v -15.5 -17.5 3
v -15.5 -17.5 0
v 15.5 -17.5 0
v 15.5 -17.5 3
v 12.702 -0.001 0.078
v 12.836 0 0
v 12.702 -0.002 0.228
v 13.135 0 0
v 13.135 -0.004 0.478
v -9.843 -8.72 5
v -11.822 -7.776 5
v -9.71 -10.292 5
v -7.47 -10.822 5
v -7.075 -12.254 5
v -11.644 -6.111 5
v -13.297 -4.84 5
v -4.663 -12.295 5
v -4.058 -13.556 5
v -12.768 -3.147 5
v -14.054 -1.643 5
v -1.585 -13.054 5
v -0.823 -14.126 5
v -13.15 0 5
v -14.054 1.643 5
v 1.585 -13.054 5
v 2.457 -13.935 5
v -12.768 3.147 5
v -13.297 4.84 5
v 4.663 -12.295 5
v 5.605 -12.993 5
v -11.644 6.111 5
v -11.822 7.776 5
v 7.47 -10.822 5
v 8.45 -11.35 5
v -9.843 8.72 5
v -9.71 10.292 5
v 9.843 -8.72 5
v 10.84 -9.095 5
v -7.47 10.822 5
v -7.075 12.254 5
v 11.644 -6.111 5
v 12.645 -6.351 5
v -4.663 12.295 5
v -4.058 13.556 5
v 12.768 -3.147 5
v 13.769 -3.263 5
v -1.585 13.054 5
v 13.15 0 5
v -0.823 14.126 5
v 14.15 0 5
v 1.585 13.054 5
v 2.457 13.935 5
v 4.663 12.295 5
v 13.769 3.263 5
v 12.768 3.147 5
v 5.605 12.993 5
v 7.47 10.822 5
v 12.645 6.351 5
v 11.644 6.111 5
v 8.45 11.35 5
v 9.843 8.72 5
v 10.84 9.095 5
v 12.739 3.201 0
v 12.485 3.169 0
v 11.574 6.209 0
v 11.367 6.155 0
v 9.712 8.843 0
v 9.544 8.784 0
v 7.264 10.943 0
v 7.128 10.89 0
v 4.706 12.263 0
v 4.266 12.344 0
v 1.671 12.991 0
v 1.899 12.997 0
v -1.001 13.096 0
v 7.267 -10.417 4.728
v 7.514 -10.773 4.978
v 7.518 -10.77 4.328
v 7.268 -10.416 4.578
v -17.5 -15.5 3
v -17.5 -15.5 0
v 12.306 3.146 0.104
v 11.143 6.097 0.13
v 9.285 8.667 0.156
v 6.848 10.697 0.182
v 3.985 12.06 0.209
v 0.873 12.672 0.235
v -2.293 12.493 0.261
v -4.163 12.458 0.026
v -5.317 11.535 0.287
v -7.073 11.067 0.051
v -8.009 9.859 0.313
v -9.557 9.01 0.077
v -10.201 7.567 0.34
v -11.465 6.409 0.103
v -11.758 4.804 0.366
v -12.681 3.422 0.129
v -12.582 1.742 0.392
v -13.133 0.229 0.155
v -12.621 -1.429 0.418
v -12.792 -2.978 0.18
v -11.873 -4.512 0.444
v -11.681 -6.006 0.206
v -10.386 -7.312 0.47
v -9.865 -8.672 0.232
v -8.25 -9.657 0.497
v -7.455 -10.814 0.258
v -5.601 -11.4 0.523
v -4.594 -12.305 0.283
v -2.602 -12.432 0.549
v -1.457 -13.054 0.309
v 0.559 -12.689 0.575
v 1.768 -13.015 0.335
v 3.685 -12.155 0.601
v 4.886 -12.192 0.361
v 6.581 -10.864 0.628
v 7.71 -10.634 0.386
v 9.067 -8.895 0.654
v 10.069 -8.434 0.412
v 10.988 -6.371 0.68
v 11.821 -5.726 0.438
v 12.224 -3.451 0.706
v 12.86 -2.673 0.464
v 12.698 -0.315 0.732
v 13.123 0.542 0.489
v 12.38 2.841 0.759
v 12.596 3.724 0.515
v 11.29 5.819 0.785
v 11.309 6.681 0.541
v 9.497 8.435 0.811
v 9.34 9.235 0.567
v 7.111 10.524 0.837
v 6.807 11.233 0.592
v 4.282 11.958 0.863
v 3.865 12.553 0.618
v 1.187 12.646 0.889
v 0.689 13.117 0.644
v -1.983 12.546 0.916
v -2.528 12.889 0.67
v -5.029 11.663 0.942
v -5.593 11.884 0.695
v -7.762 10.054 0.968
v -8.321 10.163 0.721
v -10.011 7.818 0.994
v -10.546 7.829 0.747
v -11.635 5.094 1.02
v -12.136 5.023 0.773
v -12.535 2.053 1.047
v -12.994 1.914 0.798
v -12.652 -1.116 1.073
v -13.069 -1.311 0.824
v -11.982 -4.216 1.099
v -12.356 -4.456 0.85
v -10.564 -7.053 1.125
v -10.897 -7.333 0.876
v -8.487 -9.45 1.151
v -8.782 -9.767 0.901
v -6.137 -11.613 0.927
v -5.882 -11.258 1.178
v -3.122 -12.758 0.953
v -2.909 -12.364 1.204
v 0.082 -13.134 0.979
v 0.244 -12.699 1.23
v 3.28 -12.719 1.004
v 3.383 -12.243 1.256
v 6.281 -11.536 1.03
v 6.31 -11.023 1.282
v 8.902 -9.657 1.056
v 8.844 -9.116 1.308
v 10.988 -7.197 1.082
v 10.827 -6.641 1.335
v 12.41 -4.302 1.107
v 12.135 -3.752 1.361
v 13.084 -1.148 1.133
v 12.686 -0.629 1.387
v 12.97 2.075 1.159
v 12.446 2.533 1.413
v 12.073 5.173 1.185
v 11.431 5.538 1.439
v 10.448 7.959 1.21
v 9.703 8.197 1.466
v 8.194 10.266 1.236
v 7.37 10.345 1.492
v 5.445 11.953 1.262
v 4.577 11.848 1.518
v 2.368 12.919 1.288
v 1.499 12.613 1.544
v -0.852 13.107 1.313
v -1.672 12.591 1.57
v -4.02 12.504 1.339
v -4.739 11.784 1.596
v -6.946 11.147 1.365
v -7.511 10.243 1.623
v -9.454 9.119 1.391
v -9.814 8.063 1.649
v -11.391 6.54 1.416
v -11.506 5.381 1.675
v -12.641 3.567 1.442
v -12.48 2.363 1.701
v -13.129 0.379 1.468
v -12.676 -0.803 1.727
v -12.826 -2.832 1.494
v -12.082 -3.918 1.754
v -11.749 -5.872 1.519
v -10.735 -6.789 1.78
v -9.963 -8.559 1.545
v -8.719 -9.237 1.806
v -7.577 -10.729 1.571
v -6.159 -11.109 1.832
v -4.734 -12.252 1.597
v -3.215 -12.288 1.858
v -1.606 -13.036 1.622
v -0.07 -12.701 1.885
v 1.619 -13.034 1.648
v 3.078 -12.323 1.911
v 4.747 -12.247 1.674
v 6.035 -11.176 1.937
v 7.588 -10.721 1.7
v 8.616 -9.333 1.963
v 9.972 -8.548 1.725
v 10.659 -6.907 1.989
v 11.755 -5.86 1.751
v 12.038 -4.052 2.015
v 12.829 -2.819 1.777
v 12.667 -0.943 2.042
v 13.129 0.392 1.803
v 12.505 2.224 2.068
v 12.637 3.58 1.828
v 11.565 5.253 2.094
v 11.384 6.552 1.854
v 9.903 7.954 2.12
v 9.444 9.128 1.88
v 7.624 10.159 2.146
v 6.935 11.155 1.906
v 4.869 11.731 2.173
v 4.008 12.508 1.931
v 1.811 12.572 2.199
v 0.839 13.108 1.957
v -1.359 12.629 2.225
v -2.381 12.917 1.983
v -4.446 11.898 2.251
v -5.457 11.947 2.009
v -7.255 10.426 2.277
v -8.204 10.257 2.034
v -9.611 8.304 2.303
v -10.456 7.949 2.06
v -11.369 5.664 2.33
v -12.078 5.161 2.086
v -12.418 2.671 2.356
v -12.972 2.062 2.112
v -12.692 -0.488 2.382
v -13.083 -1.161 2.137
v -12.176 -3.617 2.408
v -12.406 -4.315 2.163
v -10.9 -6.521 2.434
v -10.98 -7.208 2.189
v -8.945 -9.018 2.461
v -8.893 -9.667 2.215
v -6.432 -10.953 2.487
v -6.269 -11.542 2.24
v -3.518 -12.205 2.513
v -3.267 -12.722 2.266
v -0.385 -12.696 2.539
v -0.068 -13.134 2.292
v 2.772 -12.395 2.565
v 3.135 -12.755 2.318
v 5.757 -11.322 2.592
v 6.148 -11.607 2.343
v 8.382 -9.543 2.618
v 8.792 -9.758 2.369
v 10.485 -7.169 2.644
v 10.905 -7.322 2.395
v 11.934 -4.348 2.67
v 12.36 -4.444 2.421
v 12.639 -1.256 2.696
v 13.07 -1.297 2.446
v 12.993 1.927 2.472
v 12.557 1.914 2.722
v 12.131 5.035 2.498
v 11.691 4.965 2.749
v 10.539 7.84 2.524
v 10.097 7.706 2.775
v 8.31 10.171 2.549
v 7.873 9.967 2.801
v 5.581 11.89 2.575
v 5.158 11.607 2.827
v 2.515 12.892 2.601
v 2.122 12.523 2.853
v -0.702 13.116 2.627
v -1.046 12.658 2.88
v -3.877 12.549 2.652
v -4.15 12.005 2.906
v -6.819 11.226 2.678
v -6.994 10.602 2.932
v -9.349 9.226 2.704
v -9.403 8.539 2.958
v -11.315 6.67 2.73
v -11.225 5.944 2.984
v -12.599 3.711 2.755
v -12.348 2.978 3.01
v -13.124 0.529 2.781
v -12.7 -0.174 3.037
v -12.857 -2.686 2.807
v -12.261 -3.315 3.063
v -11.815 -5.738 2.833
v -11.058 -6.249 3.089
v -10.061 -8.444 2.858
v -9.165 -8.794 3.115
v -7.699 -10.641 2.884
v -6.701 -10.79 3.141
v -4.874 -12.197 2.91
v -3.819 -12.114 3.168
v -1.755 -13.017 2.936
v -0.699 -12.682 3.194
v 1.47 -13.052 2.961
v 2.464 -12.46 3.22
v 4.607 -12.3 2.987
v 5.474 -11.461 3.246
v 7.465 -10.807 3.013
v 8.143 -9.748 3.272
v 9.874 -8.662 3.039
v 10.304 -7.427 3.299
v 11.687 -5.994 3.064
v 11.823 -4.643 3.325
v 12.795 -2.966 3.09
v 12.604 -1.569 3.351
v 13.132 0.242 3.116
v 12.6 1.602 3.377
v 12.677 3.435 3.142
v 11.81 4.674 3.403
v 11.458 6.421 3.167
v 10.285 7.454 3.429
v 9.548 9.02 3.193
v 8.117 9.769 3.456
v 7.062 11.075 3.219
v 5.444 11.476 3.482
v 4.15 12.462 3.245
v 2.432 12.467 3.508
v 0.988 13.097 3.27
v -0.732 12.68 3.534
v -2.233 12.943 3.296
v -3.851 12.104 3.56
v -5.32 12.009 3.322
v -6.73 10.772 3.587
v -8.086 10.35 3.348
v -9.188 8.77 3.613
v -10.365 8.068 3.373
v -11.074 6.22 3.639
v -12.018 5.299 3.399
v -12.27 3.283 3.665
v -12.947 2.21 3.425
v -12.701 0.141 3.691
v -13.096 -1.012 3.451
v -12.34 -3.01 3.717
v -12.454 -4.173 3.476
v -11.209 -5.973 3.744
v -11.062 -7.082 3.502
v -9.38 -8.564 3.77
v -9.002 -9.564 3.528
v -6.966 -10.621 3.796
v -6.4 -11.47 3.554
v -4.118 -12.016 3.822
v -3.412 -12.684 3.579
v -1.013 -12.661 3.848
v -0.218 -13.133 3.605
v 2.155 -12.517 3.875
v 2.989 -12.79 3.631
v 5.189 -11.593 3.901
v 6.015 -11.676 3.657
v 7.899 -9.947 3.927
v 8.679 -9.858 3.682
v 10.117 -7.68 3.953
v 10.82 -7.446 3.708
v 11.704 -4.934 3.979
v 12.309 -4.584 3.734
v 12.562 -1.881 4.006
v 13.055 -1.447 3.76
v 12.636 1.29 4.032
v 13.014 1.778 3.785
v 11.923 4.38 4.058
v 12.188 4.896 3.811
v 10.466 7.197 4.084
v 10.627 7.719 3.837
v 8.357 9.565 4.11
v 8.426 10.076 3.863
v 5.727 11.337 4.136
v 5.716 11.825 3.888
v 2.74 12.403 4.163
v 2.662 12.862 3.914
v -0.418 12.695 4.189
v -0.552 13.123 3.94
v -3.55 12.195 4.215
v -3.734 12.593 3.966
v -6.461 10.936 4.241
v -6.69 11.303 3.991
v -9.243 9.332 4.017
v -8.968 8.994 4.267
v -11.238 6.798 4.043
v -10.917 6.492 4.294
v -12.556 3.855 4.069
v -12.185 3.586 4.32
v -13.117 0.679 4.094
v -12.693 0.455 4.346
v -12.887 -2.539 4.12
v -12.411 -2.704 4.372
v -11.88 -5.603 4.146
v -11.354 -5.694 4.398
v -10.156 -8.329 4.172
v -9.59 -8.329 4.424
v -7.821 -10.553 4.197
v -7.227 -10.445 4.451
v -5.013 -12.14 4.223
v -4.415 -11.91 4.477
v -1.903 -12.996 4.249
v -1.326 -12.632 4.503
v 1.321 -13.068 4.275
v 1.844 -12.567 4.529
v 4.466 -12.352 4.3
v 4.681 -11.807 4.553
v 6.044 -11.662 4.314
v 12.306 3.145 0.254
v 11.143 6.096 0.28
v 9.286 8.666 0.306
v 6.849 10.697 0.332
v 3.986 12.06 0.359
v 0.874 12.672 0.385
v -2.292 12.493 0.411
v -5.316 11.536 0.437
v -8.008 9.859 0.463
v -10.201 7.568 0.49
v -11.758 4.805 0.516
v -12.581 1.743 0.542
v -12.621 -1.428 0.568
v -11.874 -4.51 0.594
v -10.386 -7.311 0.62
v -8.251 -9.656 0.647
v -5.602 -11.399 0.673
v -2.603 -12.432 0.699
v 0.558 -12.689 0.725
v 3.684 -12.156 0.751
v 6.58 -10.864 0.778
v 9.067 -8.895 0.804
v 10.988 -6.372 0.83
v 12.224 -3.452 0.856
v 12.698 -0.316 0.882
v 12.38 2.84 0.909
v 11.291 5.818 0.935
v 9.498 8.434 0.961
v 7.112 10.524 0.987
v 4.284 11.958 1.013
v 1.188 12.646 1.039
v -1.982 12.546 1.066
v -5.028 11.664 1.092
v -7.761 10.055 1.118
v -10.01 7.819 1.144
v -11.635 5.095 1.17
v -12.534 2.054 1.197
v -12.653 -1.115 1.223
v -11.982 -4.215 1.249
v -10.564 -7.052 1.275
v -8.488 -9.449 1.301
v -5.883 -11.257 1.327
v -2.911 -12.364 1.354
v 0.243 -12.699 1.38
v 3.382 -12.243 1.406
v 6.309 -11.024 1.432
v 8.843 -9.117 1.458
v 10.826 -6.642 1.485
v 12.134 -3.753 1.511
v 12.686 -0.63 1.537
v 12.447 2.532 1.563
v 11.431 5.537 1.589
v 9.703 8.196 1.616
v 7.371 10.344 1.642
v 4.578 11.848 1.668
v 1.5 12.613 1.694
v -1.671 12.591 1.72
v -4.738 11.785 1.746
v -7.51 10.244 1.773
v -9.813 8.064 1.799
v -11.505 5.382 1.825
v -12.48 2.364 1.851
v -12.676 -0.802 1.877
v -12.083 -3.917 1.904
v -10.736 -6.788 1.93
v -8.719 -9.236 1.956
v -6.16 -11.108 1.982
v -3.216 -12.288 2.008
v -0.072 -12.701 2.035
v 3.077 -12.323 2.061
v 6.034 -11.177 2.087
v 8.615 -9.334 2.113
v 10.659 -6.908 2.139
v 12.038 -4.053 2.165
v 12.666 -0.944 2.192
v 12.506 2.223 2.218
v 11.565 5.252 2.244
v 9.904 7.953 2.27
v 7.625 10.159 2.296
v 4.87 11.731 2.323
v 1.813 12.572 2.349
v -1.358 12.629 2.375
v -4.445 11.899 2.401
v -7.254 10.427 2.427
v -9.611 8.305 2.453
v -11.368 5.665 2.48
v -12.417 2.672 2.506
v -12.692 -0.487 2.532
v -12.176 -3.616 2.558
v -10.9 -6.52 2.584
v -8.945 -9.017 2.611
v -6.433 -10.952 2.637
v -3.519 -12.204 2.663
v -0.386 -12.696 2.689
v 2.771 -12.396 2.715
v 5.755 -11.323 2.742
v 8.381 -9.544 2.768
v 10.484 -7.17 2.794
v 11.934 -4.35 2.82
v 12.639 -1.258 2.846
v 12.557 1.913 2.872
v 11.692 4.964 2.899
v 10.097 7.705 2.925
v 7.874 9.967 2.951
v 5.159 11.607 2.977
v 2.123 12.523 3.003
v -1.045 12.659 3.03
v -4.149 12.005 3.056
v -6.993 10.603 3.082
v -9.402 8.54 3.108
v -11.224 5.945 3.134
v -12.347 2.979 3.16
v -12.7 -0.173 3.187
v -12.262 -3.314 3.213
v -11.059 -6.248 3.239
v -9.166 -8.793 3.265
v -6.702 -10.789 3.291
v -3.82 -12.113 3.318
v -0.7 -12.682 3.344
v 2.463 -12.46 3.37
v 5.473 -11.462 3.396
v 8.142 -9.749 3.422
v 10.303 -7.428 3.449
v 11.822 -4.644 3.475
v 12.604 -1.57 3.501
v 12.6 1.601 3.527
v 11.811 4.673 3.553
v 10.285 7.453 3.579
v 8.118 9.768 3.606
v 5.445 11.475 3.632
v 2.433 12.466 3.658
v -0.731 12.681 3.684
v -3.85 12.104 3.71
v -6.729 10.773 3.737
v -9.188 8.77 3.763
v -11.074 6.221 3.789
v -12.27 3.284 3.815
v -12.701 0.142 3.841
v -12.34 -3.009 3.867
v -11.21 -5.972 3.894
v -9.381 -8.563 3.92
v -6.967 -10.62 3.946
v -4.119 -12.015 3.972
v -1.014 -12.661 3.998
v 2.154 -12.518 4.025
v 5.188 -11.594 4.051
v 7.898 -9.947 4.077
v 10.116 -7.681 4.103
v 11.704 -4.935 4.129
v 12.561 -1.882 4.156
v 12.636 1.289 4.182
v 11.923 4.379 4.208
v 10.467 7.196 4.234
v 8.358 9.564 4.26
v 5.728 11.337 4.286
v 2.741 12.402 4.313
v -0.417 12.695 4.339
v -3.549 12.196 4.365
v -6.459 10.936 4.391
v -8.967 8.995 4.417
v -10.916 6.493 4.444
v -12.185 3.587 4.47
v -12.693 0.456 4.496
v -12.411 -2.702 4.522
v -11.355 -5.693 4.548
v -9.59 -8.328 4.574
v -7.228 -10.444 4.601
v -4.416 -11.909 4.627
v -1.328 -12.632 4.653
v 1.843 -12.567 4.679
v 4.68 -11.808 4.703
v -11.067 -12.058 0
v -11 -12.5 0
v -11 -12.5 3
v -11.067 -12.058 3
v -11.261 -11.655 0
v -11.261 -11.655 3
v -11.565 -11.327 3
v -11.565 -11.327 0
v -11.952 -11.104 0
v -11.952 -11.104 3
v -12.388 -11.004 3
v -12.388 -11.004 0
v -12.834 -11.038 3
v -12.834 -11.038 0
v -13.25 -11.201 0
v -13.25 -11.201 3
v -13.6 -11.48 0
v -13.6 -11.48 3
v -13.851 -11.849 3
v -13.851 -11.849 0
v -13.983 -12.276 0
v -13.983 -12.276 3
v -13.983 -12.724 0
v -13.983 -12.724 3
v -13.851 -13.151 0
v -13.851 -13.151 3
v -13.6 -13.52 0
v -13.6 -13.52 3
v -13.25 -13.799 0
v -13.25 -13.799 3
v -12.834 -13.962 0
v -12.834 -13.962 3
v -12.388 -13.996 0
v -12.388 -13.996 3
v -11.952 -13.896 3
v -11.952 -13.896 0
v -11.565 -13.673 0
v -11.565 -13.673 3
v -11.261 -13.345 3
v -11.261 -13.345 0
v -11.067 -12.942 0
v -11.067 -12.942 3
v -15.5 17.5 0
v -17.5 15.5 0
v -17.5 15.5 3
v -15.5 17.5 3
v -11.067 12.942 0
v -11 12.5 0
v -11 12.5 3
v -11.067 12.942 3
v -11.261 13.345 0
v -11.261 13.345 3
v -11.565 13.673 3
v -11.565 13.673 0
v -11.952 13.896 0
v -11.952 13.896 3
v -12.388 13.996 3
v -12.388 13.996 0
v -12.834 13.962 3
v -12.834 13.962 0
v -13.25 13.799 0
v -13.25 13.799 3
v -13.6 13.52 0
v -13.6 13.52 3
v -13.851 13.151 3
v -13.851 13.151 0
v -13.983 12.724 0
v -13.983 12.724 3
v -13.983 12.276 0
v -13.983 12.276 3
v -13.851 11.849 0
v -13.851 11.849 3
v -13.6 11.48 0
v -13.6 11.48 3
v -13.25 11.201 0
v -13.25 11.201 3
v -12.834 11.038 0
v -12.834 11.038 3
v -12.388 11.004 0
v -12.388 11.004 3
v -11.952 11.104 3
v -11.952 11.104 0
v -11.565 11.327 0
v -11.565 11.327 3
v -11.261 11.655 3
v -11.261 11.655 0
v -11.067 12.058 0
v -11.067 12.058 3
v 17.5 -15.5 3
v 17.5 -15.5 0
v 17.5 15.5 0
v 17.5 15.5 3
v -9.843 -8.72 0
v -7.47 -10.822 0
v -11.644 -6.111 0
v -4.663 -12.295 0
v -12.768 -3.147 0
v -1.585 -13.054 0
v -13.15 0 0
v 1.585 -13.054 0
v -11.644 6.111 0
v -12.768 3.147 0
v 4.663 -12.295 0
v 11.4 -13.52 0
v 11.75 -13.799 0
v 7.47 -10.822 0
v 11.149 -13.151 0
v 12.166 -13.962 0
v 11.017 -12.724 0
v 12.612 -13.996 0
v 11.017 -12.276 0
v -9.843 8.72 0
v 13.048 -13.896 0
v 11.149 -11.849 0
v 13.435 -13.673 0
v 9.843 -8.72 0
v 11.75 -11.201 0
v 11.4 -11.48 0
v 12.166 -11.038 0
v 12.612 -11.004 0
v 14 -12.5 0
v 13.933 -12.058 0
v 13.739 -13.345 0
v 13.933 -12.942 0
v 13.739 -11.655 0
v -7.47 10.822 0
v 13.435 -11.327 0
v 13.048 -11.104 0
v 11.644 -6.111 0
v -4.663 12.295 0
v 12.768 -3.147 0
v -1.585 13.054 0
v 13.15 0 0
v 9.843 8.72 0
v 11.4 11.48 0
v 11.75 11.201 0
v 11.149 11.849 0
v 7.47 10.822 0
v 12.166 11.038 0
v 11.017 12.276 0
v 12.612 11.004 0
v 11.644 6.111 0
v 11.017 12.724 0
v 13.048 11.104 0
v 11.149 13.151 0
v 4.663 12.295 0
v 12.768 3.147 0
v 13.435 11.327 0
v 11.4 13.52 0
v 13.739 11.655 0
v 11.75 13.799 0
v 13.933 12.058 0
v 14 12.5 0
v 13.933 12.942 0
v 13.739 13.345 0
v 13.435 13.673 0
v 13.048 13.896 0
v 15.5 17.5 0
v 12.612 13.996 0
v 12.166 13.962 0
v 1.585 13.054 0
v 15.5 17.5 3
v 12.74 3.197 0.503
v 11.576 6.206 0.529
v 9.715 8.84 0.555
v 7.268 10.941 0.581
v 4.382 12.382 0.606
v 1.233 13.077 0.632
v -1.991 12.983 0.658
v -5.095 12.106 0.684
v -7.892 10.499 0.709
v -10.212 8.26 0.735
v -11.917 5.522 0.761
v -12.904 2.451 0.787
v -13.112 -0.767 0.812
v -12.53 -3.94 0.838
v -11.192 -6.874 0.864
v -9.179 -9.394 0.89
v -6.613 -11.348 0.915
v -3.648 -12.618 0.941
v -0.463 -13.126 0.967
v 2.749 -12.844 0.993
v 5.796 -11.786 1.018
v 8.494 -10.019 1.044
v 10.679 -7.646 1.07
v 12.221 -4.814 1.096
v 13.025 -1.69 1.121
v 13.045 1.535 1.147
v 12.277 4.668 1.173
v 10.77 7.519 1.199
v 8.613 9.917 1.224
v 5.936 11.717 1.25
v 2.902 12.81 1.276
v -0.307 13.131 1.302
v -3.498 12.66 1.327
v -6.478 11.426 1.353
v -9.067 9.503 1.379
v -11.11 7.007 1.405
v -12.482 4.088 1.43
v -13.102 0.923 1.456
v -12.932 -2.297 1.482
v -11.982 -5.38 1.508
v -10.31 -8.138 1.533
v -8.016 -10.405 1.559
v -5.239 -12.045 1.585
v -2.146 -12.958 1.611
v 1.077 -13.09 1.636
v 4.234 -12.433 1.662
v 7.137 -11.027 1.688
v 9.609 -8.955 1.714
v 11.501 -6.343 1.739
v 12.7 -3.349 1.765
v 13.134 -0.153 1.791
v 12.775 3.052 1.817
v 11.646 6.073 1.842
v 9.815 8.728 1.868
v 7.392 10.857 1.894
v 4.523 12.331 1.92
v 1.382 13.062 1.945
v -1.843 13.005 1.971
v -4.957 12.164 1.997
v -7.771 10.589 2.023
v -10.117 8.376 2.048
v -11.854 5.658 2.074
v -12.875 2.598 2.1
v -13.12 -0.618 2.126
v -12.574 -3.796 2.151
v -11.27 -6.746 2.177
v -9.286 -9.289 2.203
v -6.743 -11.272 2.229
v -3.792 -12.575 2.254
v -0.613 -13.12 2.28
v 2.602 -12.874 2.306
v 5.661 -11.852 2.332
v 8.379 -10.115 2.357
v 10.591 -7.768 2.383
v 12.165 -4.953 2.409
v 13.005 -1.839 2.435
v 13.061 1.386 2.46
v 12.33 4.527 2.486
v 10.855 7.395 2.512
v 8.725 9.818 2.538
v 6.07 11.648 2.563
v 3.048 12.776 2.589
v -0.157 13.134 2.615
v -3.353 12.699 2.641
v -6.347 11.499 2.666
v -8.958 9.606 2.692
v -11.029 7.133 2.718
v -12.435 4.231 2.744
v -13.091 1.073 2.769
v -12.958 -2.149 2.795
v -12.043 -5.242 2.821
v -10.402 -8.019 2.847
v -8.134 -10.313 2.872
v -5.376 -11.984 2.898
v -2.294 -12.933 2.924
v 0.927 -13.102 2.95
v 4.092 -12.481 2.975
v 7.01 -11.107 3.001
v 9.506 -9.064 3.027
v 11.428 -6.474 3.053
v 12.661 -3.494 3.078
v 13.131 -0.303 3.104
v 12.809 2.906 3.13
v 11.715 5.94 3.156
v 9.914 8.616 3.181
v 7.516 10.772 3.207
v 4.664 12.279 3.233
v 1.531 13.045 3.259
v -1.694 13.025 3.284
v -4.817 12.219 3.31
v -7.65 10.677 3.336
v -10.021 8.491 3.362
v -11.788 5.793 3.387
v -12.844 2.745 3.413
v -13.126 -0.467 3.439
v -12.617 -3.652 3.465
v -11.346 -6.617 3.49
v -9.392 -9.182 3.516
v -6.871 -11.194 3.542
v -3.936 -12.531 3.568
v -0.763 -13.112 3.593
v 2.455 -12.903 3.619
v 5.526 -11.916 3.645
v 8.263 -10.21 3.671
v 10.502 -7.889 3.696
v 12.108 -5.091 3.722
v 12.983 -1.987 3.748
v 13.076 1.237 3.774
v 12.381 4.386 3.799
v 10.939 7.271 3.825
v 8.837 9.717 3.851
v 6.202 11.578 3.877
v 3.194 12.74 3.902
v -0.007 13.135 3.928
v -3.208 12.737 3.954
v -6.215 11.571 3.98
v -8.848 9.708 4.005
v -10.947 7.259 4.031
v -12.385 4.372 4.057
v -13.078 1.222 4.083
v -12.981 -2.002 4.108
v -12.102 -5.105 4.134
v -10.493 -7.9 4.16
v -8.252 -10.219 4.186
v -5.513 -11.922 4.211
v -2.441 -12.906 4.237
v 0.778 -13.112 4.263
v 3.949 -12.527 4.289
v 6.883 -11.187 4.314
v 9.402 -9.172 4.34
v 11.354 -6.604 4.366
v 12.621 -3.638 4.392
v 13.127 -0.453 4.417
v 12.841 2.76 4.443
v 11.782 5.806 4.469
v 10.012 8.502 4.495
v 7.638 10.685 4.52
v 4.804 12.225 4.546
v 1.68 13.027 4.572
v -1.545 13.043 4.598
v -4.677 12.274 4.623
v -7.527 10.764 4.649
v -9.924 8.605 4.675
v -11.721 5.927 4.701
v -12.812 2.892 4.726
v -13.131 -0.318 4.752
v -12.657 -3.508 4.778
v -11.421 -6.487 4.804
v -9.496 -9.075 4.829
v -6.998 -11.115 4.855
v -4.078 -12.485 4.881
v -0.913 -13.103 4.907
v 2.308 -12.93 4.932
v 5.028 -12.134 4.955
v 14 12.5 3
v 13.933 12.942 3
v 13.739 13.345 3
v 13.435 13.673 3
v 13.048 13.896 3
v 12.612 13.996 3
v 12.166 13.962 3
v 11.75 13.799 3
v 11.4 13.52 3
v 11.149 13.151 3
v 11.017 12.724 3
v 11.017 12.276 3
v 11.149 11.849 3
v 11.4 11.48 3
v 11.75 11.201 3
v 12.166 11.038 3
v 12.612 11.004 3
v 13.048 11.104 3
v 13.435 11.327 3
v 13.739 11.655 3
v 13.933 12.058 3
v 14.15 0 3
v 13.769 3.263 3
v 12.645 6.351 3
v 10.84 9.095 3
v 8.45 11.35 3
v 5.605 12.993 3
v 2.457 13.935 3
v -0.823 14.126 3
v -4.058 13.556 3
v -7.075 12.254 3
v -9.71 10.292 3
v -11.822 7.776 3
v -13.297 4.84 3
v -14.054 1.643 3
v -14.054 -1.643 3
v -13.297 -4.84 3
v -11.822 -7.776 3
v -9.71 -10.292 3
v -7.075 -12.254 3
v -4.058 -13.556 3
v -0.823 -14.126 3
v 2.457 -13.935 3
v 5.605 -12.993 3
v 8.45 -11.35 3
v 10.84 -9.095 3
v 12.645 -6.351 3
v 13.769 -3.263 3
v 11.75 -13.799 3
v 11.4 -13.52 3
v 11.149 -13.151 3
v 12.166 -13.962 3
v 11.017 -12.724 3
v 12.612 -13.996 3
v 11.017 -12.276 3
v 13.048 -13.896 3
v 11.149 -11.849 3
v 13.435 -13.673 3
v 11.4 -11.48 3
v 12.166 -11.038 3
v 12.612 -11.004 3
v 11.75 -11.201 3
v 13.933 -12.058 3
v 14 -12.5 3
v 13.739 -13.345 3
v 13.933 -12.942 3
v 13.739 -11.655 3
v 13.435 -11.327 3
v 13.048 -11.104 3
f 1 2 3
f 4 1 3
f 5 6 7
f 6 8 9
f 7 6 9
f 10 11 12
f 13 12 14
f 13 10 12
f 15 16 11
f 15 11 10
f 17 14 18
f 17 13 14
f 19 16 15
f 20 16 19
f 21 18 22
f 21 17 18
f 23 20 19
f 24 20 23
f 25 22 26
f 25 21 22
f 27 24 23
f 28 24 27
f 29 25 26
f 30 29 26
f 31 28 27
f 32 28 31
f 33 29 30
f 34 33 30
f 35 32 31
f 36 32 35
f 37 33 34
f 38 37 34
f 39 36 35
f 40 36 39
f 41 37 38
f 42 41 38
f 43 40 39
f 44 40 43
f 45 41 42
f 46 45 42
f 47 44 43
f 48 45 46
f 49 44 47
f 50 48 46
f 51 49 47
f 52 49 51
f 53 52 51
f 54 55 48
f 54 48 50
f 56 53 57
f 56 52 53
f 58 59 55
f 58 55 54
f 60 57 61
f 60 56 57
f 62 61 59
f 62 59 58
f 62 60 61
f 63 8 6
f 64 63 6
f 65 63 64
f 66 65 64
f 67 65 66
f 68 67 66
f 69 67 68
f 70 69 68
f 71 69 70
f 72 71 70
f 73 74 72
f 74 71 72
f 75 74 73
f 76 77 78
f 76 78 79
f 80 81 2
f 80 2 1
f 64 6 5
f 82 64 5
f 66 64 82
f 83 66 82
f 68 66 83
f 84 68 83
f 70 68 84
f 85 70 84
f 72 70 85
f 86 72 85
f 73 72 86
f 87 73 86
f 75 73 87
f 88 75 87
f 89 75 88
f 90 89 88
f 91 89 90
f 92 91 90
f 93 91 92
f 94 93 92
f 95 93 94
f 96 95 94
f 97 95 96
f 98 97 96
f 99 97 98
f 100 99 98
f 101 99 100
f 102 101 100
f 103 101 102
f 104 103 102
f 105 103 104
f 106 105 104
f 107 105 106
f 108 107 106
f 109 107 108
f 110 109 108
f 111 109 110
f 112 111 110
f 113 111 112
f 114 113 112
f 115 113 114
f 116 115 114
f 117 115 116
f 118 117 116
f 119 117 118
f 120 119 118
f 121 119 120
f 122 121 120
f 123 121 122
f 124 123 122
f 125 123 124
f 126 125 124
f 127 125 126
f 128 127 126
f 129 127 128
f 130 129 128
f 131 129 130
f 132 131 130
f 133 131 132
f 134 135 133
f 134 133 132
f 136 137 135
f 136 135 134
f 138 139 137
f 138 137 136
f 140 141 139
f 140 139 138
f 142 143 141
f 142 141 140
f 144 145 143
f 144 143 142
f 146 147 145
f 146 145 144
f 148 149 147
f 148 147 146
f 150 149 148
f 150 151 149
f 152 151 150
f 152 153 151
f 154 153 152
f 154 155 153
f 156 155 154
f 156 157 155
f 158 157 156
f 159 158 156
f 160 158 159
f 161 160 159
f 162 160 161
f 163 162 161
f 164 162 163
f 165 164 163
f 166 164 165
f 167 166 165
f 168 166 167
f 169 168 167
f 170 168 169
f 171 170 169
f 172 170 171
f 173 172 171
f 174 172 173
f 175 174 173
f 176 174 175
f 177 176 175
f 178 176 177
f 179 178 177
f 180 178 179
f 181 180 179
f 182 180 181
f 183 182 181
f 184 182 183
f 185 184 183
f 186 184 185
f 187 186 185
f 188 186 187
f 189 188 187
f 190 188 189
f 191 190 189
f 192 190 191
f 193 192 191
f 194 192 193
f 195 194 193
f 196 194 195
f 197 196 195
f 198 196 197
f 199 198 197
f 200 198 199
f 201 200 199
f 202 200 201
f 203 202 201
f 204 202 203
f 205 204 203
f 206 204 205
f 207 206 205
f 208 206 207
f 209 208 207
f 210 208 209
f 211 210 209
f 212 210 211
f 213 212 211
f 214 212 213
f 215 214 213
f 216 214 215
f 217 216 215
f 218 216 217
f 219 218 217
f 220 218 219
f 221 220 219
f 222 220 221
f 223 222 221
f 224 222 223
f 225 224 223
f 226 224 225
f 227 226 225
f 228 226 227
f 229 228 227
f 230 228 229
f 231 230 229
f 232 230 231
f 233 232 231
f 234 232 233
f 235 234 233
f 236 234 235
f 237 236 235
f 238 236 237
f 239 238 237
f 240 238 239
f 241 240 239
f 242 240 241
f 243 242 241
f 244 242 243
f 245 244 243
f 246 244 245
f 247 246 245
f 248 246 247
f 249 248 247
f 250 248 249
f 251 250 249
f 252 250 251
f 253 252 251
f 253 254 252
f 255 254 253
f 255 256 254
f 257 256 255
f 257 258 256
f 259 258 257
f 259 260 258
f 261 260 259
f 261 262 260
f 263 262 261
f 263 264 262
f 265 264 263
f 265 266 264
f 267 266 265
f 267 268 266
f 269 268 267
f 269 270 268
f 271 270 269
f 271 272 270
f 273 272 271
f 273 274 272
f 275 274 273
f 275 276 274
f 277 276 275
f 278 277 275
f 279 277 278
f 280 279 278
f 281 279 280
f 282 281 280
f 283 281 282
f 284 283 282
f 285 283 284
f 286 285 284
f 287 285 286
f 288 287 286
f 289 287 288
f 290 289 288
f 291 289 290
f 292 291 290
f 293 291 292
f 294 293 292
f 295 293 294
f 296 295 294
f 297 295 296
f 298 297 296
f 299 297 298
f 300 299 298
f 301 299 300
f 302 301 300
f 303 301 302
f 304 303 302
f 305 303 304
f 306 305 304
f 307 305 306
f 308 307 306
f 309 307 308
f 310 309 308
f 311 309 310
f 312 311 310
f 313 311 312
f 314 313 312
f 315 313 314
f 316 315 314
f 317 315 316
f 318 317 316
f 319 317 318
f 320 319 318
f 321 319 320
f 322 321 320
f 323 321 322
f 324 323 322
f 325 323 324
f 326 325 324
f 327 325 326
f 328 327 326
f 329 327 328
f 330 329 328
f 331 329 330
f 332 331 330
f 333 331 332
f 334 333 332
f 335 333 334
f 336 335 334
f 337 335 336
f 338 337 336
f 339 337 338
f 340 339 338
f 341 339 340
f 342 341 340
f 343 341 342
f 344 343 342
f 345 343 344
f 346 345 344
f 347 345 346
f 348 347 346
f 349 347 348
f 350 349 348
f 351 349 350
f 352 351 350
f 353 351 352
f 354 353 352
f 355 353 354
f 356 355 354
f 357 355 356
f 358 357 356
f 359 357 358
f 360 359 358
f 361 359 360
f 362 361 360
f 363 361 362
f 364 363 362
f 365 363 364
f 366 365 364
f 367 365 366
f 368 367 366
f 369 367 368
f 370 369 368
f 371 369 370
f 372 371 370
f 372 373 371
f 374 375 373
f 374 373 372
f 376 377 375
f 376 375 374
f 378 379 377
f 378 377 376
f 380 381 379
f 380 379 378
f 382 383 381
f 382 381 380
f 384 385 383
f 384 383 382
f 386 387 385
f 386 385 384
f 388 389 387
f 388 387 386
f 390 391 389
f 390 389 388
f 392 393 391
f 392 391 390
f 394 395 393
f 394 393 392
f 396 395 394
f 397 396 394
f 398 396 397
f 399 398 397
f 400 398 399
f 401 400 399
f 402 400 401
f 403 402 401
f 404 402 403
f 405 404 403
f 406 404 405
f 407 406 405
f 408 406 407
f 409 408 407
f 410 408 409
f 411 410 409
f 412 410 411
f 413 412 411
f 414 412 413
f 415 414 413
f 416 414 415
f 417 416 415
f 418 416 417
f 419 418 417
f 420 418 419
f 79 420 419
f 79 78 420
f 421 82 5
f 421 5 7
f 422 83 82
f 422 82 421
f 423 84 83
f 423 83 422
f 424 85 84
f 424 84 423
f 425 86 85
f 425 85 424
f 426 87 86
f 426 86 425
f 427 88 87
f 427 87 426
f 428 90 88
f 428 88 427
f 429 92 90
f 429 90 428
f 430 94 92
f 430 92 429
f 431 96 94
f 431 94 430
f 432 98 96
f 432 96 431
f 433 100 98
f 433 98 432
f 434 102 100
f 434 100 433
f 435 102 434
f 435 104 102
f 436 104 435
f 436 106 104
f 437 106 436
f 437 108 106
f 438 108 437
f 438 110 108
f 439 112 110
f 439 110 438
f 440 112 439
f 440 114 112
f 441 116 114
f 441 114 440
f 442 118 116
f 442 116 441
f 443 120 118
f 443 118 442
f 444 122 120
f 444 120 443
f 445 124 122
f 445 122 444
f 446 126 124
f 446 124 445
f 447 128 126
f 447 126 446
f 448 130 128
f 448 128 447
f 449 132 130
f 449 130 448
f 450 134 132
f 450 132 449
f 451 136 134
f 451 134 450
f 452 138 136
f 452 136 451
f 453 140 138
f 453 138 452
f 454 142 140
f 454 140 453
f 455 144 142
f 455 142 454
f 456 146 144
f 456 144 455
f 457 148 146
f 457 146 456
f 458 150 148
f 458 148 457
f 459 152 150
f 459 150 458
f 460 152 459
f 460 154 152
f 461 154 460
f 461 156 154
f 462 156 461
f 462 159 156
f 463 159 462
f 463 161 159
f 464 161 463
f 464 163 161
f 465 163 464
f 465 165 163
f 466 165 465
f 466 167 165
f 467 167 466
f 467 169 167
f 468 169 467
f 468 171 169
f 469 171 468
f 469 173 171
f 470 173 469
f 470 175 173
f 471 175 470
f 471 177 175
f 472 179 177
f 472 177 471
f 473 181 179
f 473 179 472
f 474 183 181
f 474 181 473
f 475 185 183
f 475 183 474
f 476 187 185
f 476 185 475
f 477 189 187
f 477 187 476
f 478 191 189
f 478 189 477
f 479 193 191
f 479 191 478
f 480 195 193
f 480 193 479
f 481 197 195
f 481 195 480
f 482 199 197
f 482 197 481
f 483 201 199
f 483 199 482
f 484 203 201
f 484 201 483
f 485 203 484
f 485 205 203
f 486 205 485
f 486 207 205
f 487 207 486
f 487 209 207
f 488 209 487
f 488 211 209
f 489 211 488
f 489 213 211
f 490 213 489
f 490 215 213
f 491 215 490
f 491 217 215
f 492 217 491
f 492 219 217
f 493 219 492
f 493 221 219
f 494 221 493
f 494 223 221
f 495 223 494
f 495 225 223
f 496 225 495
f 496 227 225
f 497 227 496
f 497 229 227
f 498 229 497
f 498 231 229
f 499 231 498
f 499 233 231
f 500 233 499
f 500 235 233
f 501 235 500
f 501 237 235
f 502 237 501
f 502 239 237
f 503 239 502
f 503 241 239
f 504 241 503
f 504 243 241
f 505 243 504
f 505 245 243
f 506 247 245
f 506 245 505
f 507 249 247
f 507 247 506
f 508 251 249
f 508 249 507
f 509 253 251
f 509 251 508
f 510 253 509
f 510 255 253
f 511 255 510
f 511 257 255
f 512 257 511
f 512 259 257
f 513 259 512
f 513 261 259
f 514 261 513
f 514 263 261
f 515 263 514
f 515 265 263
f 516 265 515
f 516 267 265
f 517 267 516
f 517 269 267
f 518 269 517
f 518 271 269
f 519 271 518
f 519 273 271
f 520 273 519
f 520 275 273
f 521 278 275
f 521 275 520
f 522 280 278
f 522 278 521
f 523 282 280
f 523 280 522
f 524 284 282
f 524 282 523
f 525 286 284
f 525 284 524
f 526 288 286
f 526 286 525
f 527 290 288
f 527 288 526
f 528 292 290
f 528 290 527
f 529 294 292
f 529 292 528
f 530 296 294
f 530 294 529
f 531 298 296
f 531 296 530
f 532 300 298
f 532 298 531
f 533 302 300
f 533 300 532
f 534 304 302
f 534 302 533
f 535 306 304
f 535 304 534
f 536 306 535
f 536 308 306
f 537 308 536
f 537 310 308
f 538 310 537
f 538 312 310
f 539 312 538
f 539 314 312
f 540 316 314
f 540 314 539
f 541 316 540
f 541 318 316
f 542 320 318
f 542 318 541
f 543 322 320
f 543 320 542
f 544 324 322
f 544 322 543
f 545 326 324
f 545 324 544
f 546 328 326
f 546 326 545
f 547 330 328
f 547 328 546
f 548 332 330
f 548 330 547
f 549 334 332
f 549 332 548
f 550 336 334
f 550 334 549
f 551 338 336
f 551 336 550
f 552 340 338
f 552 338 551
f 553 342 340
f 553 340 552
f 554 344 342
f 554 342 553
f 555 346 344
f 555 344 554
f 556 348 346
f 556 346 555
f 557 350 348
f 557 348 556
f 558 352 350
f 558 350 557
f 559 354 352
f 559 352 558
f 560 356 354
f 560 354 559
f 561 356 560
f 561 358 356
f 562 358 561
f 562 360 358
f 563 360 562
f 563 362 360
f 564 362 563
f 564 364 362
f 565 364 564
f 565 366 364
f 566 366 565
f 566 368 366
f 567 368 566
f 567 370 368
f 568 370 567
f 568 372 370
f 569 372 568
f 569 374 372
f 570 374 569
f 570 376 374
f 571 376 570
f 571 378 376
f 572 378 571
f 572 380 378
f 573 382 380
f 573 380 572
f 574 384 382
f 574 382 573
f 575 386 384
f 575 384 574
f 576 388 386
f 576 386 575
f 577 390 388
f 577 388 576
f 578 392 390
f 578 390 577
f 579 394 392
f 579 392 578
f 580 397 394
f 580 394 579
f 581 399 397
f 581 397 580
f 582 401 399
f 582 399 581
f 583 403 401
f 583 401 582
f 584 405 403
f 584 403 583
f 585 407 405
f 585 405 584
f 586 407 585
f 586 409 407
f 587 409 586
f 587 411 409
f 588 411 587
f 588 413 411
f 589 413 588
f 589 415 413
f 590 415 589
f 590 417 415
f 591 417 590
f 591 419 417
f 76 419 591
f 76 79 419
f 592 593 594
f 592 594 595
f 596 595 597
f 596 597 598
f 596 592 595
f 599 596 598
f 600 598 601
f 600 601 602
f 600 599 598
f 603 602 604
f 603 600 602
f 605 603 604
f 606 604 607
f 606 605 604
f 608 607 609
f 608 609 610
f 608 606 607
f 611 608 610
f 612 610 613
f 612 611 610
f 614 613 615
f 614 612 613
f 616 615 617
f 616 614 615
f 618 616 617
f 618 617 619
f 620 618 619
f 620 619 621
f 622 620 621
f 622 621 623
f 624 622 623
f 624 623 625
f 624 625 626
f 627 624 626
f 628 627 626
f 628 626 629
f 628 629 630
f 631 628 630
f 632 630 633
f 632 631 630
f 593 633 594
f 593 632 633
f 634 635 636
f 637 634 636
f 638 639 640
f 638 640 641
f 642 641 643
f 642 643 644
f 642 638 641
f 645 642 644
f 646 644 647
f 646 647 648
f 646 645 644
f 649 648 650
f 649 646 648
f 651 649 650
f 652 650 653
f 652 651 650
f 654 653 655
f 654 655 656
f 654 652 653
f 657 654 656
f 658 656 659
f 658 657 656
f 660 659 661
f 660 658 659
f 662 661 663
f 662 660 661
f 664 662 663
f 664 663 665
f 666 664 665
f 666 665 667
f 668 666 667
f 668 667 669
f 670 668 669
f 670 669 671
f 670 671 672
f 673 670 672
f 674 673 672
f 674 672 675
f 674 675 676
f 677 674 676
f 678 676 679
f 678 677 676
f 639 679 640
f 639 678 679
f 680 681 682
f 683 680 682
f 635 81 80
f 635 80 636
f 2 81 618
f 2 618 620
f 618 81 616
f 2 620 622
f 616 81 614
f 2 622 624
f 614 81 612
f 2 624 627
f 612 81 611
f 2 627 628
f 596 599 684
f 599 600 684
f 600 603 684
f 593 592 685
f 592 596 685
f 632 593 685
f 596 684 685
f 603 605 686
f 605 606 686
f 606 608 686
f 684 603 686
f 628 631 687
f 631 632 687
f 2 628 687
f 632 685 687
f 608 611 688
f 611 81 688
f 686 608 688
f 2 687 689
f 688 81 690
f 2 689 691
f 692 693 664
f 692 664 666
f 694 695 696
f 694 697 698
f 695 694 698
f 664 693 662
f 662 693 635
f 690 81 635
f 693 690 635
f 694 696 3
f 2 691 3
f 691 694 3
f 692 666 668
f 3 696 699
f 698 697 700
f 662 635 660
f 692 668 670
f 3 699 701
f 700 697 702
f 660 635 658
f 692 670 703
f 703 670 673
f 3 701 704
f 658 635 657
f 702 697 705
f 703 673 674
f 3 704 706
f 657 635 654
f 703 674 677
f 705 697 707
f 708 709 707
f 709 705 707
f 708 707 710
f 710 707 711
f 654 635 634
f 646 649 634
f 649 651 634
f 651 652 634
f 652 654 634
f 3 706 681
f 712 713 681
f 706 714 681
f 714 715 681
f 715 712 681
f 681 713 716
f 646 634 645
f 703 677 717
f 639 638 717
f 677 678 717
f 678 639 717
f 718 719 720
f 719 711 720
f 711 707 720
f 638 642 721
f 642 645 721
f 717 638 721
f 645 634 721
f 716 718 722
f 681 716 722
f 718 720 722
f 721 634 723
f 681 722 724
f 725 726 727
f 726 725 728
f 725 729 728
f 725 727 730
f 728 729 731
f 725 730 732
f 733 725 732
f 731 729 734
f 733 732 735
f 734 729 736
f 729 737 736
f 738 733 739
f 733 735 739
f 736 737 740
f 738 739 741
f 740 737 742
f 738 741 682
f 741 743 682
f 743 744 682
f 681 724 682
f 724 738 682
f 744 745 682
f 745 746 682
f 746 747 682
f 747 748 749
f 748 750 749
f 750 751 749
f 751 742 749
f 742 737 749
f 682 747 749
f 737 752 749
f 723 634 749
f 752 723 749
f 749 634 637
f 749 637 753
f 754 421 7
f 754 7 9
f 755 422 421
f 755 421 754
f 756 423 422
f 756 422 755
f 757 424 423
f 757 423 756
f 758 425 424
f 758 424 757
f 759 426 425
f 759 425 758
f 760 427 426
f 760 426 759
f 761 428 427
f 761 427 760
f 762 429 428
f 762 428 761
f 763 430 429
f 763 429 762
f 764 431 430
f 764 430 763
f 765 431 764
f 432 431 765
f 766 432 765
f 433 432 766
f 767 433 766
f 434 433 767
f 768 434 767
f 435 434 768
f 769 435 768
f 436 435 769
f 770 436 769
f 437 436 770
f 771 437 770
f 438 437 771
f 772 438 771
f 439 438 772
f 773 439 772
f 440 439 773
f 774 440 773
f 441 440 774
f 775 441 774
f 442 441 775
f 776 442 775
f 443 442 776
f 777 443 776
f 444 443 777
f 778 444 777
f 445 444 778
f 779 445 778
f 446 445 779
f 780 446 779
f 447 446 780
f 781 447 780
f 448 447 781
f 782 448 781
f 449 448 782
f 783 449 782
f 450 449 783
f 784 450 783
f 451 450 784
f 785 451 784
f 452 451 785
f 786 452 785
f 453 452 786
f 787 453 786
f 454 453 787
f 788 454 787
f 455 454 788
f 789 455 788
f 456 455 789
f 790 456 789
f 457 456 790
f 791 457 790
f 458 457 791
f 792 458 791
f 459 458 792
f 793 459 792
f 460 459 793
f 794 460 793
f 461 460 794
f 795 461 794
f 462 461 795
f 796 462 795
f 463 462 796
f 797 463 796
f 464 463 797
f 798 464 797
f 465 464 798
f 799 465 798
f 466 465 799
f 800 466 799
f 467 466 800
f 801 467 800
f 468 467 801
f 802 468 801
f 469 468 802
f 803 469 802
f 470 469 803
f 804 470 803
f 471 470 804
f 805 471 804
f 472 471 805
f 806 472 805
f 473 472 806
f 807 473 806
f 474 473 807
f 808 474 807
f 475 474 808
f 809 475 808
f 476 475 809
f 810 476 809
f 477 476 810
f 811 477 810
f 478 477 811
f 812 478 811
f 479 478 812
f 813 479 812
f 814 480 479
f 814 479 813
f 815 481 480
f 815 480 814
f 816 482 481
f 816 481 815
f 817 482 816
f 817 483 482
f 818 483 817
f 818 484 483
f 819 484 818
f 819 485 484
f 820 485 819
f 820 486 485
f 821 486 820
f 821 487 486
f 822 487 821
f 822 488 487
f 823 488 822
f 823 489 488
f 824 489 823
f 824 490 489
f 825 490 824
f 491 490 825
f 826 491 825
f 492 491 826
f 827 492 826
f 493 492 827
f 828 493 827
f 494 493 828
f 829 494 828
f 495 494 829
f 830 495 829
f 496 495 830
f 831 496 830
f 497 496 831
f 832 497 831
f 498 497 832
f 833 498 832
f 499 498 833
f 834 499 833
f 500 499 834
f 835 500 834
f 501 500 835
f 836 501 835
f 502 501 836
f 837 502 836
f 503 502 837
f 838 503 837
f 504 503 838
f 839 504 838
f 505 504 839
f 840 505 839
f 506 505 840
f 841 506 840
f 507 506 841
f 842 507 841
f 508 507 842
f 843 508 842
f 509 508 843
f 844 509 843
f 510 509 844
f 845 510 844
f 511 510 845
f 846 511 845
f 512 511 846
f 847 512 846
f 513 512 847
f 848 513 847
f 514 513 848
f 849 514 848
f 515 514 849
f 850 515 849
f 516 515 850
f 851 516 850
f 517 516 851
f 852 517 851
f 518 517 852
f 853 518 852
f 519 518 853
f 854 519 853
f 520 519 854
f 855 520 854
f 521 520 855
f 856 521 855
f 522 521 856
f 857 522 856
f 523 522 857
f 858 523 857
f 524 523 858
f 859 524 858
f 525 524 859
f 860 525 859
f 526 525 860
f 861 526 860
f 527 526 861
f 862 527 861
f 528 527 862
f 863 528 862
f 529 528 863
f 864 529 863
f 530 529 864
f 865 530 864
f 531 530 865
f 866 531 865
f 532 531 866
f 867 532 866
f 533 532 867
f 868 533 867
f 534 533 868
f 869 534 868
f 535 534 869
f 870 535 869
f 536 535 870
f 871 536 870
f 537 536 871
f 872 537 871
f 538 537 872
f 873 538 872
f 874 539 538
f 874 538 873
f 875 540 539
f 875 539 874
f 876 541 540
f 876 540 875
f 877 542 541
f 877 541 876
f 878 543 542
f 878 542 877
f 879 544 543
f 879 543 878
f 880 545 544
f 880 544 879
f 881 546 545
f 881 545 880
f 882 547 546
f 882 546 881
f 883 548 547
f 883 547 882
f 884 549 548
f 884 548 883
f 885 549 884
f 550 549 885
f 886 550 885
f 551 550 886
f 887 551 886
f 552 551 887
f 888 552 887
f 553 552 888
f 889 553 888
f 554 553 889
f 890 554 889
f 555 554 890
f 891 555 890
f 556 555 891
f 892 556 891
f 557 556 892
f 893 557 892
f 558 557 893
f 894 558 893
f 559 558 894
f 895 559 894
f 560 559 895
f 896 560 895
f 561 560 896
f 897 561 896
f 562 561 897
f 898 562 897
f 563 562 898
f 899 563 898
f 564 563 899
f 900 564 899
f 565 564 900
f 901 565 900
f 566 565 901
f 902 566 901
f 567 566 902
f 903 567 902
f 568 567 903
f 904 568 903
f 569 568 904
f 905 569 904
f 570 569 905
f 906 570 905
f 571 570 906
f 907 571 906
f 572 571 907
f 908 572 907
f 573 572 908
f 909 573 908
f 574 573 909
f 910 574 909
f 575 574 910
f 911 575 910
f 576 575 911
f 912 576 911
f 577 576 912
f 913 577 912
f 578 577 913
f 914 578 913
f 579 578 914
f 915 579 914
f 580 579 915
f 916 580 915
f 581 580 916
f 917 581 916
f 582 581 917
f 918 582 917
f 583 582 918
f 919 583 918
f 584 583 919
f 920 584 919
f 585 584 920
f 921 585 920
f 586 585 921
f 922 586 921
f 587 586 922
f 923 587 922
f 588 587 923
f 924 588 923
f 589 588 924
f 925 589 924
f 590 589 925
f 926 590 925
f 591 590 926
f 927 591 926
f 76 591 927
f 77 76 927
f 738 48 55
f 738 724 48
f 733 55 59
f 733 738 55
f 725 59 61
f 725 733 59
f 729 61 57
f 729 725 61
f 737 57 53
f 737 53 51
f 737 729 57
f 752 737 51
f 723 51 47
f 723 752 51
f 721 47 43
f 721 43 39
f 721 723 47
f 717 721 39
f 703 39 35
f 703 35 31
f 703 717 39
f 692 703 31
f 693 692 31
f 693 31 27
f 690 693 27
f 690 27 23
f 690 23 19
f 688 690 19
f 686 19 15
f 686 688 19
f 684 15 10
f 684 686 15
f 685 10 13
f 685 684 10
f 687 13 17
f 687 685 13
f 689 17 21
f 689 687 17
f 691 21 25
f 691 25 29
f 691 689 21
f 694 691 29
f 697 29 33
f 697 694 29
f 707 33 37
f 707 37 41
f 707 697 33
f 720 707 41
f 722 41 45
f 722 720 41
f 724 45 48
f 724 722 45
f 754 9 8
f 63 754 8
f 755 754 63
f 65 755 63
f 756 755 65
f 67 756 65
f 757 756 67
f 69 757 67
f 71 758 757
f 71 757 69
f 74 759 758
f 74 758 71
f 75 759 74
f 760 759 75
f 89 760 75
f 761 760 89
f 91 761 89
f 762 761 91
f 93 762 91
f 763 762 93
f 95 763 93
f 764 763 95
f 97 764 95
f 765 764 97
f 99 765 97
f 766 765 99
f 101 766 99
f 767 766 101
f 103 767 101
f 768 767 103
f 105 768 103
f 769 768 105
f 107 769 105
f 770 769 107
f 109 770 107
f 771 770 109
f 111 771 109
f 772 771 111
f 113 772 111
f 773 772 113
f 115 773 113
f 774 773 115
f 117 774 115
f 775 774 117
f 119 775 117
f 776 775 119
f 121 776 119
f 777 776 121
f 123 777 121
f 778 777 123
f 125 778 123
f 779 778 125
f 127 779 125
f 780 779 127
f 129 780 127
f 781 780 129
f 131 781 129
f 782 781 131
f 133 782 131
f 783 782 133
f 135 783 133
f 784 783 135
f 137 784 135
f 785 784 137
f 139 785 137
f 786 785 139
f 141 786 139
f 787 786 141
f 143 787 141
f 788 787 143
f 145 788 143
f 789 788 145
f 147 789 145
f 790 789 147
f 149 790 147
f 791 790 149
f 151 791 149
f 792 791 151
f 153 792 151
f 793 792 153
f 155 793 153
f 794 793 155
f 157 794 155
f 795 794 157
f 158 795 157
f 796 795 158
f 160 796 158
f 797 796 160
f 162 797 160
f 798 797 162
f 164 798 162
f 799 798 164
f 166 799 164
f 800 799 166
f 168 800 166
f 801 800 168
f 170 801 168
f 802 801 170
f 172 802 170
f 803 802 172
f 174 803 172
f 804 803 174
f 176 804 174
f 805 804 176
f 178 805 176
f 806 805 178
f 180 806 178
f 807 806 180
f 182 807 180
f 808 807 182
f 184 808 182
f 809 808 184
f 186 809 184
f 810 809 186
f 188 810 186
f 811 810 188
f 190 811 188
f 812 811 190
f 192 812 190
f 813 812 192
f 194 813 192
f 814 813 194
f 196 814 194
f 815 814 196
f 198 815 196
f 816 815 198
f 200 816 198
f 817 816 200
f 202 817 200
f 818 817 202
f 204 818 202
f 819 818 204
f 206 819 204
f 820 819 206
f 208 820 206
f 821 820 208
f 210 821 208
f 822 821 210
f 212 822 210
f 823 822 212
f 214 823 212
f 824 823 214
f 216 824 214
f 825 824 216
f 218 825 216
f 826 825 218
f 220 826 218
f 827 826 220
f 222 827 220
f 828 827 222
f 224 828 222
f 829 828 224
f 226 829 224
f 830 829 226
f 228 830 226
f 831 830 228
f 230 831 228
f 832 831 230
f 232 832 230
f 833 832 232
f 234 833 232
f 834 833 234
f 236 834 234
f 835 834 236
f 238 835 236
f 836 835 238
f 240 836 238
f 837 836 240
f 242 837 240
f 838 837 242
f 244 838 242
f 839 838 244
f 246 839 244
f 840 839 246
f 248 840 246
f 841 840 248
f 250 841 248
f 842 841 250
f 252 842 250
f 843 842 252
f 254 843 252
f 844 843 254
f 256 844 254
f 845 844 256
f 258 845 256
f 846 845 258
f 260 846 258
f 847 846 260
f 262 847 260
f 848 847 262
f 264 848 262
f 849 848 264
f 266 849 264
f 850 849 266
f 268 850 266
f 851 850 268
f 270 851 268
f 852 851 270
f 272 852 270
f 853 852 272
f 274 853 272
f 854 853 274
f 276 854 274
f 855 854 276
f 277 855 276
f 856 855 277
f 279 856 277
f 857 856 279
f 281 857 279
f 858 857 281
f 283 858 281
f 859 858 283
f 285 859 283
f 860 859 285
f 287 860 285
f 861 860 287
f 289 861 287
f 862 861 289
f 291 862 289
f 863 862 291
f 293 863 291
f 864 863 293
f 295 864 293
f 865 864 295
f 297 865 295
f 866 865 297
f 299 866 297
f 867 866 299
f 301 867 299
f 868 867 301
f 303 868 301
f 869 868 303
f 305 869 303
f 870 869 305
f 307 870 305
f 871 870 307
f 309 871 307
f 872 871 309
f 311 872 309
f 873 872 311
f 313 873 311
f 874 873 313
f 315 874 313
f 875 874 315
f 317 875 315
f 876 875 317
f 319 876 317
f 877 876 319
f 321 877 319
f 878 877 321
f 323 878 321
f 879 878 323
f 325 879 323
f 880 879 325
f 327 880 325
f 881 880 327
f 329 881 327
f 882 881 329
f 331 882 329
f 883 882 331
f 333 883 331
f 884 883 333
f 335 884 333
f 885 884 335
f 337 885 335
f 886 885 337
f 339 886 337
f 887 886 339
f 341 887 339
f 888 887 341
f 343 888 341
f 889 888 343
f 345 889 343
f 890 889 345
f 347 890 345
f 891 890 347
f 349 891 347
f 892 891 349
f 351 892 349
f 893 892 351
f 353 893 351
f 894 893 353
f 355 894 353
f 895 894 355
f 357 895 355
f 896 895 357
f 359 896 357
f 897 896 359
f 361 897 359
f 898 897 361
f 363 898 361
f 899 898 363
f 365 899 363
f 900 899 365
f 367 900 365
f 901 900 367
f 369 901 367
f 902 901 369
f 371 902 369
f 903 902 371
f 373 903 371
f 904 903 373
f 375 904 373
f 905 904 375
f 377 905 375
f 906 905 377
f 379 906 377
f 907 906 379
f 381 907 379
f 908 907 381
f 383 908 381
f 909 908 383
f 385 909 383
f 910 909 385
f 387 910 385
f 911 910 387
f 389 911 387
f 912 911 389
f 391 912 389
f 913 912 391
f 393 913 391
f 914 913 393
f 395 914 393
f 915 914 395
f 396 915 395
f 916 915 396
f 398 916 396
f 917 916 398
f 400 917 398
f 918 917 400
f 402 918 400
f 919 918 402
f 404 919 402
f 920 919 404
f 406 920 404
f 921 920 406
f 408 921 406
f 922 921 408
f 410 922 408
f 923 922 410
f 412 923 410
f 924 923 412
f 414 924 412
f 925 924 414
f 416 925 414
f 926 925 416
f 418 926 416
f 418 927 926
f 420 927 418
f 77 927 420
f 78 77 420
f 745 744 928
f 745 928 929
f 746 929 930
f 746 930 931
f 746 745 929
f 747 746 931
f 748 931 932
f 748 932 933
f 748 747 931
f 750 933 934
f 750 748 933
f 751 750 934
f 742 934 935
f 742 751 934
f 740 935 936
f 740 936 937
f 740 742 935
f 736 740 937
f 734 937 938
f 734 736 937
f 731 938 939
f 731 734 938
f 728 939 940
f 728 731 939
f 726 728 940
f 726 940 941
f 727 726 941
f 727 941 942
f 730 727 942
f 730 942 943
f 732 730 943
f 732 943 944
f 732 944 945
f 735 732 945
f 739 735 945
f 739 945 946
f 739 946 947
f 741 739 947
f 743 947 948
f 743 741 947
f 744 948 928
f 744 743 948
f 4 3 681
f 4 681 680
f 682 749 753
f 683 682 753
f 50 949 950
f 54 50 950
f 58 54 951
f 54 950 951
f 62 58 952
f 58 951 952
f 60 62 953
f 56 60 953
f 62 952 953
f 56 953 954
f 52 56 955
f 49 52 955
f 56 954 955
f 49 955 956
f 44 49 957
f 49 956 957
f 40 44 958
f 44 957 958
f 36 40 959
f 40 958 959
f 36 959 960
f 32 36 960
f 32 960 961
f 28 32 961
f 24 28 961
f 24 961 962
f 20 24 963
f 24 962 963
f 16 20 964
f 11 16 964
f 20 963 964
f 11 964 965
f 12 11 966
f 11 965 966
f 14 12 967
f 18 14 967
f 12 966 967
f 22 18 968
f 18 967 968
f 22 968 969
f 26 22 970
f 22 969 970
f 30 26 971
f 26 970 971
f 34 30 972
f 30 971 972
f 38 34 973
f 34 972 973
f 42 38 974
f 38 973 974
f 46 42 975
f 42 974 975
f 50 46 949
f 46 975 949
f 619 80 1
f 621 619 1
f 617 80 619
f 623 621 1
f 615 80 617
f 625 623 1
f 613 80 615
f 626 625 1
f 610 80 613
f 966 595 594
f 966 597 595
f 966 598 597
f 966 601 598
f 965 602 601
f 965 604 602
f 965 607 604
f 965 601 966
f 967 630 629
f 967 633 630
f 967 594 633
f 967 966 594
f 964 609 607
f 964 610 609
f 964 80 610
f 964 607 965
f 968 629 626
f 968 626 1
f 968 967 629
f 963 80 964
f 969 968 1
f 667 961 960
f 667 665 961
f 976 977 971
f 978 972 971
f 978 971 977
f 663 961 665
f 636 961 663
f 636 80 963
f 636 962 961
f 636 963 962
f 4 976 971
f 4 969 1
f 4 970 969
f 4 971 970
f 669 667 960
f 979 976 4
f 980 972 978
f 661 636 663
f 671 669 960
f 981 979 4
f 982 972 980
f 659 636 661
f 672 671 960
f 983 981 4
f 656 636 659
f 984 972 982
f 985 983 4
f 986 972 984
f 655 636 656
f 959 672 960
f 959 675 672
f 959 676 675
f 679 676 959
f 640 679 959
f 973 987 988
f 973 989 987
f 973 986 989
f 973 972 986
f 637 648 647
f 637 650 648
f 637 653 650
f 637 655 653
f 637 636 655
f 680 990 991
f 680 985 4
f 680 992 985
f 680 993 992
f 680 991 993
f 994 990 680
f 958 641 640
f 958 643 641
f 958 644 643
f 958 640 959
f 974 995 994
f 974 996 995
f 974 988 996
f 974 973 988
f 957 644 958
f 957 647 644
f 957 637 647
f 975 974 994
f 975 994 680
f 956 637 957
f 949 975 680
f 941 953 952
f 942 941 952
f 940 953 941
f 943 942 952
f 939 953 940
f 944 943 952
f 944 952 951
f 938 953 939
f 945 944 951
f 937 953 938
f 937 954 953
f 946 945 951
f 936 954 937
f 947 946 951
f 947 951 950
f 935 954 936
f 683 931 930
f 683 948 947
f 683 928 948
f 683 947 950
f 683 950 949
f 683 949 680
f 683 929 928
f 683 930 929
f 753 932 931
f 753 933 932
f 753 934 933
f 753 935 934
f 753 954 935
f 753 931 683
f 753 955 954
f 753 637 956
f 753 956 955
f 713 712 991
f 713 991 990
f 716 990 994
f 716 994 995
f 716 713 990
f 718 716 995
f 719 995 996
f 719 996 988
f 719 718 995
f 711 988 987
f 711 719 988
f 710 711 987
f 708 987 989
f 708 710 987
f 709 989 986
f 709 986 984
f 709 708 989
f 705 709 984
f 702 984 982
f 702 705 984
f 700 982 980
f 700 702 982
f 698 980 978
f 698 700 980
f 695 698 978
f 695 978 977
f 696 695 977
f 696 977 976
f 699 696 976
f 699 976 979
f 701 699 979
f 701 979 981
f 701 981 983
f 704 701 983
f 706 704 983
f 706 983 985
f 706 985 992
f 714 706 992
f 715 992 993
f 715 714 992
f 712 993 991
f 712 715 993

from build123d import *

# Parameters (mm, degrees)
SKETCH1_W           = 35
SKETCH1_H           = 35
SKETCH1_R           = 1.5
SKETCH1_R_2         = 13.15
BOSS_EXTRUDE1_DEPTH = 3
SKETCH3_R           = 14.15
SKETCH3_R_2         = 13.15
BOSS_EXTRUDE2_DEPTH = 2
CHAMFER1_SIZE       = 2
SWEEP1_PITCH        = 0.657225
SWEEP1_HEIGHT       = 4.5
SWEEP1_RADIUS       = 13.145
SKETCH6_R           = 26.617101451
CUT_EXTRUDE1_DEPTH  = 1.172278619


with BuildPart() as part:
    # Sketch1 → Boss-Extrude1 (new body)
    with BuildSketch(Plane.XY):
        Rectangle(SKETCH1_W, SKETCH1_H)
        with Locations((-12.5, 12.5)):
            Circle(SKETCH1_R, mode=Mode.SUBTRACT)
        with Locations((12.5, 12.5)):
            Circle(SKETCH1_R, mode=Mode.SUBTRACT)
        with Locations((-12.5, -12.5)):
            Circle(SKETCH1_R, mode=Mode.SUBTRACT)
        with Locations((12.5, -12.5)):
            Circle(SKETCH1_R, mode=Mode.SUBTRACT)
        Circle(SKETCH1_R_2, mode=Mode.SUBTRACT)
    extrude(amount=BOSS_EXTRUDE1_DEPTH)

    # Sketch3 → Boss-Extrude2 (add)
    with BuildSketch(Plane.XY.offset(3)):
        Circle(SKETCH3_R)
        Circle(SKETCH3_R_2, mode=Mode.SUBTRACT)
    extrude(amount=BOSS_EXTRUDE2_DEPTH)

    # Chamfer1
    chamfer1_edges = [part.edges().sort_by_distance(p)[0] for p in [
        (17.5, -17.5, 1.5),
        (-17.5, -17.5, 1.5),
        (-17.5, 17.5, 1.5),
        (17.5, 17.5, 1.5),
    ]]
    chamfer(chamfer1_edges, length=CHAMFER1_SIZE)


with BuildPart() as body_2:
    # Sweep1: sweep along a helix
    with BuildLine() as sweep1_path:
        Helix(SWEEP1_PITCH, SWEEP1_HEIGHT, SWEEP1_RADIUS, center=(0, 0, 0), direction=(0, 0, 1))
    # Sketch5 → Sweep1 (sweep)
    with BuildSketch(Plane(origin=(7.522603109, -10.779678449, 4.5), x_dir=(0.006525369, 0.004553732, -0.999968341), z_dir=(0.820033258, 0.572260552, 0.007957193))):
        Polygon((-0.227716027, 0.443383435), (-0.077716027, 0.443383435), (0.172283973, 0.010370734), (-0.477716027, 0.010370734), align=None)
    sweep(path=sweep1_path.line, is_frenet=True)

    # Sketch6 → Cut-Extrude1 (cut, through all)
    with BuildSketch(Plane(origin=(0, 0, 0), x_dir=(-1, 0, 0), z_dir=(0, 0, -1))):
        Circle(SKETCH6_R)
    extrude(amount=CUT_EXTRUDE1_DEPTH, mode=Mode.SUBTRACT)


solid = Compound([part.part, body_2.part])
